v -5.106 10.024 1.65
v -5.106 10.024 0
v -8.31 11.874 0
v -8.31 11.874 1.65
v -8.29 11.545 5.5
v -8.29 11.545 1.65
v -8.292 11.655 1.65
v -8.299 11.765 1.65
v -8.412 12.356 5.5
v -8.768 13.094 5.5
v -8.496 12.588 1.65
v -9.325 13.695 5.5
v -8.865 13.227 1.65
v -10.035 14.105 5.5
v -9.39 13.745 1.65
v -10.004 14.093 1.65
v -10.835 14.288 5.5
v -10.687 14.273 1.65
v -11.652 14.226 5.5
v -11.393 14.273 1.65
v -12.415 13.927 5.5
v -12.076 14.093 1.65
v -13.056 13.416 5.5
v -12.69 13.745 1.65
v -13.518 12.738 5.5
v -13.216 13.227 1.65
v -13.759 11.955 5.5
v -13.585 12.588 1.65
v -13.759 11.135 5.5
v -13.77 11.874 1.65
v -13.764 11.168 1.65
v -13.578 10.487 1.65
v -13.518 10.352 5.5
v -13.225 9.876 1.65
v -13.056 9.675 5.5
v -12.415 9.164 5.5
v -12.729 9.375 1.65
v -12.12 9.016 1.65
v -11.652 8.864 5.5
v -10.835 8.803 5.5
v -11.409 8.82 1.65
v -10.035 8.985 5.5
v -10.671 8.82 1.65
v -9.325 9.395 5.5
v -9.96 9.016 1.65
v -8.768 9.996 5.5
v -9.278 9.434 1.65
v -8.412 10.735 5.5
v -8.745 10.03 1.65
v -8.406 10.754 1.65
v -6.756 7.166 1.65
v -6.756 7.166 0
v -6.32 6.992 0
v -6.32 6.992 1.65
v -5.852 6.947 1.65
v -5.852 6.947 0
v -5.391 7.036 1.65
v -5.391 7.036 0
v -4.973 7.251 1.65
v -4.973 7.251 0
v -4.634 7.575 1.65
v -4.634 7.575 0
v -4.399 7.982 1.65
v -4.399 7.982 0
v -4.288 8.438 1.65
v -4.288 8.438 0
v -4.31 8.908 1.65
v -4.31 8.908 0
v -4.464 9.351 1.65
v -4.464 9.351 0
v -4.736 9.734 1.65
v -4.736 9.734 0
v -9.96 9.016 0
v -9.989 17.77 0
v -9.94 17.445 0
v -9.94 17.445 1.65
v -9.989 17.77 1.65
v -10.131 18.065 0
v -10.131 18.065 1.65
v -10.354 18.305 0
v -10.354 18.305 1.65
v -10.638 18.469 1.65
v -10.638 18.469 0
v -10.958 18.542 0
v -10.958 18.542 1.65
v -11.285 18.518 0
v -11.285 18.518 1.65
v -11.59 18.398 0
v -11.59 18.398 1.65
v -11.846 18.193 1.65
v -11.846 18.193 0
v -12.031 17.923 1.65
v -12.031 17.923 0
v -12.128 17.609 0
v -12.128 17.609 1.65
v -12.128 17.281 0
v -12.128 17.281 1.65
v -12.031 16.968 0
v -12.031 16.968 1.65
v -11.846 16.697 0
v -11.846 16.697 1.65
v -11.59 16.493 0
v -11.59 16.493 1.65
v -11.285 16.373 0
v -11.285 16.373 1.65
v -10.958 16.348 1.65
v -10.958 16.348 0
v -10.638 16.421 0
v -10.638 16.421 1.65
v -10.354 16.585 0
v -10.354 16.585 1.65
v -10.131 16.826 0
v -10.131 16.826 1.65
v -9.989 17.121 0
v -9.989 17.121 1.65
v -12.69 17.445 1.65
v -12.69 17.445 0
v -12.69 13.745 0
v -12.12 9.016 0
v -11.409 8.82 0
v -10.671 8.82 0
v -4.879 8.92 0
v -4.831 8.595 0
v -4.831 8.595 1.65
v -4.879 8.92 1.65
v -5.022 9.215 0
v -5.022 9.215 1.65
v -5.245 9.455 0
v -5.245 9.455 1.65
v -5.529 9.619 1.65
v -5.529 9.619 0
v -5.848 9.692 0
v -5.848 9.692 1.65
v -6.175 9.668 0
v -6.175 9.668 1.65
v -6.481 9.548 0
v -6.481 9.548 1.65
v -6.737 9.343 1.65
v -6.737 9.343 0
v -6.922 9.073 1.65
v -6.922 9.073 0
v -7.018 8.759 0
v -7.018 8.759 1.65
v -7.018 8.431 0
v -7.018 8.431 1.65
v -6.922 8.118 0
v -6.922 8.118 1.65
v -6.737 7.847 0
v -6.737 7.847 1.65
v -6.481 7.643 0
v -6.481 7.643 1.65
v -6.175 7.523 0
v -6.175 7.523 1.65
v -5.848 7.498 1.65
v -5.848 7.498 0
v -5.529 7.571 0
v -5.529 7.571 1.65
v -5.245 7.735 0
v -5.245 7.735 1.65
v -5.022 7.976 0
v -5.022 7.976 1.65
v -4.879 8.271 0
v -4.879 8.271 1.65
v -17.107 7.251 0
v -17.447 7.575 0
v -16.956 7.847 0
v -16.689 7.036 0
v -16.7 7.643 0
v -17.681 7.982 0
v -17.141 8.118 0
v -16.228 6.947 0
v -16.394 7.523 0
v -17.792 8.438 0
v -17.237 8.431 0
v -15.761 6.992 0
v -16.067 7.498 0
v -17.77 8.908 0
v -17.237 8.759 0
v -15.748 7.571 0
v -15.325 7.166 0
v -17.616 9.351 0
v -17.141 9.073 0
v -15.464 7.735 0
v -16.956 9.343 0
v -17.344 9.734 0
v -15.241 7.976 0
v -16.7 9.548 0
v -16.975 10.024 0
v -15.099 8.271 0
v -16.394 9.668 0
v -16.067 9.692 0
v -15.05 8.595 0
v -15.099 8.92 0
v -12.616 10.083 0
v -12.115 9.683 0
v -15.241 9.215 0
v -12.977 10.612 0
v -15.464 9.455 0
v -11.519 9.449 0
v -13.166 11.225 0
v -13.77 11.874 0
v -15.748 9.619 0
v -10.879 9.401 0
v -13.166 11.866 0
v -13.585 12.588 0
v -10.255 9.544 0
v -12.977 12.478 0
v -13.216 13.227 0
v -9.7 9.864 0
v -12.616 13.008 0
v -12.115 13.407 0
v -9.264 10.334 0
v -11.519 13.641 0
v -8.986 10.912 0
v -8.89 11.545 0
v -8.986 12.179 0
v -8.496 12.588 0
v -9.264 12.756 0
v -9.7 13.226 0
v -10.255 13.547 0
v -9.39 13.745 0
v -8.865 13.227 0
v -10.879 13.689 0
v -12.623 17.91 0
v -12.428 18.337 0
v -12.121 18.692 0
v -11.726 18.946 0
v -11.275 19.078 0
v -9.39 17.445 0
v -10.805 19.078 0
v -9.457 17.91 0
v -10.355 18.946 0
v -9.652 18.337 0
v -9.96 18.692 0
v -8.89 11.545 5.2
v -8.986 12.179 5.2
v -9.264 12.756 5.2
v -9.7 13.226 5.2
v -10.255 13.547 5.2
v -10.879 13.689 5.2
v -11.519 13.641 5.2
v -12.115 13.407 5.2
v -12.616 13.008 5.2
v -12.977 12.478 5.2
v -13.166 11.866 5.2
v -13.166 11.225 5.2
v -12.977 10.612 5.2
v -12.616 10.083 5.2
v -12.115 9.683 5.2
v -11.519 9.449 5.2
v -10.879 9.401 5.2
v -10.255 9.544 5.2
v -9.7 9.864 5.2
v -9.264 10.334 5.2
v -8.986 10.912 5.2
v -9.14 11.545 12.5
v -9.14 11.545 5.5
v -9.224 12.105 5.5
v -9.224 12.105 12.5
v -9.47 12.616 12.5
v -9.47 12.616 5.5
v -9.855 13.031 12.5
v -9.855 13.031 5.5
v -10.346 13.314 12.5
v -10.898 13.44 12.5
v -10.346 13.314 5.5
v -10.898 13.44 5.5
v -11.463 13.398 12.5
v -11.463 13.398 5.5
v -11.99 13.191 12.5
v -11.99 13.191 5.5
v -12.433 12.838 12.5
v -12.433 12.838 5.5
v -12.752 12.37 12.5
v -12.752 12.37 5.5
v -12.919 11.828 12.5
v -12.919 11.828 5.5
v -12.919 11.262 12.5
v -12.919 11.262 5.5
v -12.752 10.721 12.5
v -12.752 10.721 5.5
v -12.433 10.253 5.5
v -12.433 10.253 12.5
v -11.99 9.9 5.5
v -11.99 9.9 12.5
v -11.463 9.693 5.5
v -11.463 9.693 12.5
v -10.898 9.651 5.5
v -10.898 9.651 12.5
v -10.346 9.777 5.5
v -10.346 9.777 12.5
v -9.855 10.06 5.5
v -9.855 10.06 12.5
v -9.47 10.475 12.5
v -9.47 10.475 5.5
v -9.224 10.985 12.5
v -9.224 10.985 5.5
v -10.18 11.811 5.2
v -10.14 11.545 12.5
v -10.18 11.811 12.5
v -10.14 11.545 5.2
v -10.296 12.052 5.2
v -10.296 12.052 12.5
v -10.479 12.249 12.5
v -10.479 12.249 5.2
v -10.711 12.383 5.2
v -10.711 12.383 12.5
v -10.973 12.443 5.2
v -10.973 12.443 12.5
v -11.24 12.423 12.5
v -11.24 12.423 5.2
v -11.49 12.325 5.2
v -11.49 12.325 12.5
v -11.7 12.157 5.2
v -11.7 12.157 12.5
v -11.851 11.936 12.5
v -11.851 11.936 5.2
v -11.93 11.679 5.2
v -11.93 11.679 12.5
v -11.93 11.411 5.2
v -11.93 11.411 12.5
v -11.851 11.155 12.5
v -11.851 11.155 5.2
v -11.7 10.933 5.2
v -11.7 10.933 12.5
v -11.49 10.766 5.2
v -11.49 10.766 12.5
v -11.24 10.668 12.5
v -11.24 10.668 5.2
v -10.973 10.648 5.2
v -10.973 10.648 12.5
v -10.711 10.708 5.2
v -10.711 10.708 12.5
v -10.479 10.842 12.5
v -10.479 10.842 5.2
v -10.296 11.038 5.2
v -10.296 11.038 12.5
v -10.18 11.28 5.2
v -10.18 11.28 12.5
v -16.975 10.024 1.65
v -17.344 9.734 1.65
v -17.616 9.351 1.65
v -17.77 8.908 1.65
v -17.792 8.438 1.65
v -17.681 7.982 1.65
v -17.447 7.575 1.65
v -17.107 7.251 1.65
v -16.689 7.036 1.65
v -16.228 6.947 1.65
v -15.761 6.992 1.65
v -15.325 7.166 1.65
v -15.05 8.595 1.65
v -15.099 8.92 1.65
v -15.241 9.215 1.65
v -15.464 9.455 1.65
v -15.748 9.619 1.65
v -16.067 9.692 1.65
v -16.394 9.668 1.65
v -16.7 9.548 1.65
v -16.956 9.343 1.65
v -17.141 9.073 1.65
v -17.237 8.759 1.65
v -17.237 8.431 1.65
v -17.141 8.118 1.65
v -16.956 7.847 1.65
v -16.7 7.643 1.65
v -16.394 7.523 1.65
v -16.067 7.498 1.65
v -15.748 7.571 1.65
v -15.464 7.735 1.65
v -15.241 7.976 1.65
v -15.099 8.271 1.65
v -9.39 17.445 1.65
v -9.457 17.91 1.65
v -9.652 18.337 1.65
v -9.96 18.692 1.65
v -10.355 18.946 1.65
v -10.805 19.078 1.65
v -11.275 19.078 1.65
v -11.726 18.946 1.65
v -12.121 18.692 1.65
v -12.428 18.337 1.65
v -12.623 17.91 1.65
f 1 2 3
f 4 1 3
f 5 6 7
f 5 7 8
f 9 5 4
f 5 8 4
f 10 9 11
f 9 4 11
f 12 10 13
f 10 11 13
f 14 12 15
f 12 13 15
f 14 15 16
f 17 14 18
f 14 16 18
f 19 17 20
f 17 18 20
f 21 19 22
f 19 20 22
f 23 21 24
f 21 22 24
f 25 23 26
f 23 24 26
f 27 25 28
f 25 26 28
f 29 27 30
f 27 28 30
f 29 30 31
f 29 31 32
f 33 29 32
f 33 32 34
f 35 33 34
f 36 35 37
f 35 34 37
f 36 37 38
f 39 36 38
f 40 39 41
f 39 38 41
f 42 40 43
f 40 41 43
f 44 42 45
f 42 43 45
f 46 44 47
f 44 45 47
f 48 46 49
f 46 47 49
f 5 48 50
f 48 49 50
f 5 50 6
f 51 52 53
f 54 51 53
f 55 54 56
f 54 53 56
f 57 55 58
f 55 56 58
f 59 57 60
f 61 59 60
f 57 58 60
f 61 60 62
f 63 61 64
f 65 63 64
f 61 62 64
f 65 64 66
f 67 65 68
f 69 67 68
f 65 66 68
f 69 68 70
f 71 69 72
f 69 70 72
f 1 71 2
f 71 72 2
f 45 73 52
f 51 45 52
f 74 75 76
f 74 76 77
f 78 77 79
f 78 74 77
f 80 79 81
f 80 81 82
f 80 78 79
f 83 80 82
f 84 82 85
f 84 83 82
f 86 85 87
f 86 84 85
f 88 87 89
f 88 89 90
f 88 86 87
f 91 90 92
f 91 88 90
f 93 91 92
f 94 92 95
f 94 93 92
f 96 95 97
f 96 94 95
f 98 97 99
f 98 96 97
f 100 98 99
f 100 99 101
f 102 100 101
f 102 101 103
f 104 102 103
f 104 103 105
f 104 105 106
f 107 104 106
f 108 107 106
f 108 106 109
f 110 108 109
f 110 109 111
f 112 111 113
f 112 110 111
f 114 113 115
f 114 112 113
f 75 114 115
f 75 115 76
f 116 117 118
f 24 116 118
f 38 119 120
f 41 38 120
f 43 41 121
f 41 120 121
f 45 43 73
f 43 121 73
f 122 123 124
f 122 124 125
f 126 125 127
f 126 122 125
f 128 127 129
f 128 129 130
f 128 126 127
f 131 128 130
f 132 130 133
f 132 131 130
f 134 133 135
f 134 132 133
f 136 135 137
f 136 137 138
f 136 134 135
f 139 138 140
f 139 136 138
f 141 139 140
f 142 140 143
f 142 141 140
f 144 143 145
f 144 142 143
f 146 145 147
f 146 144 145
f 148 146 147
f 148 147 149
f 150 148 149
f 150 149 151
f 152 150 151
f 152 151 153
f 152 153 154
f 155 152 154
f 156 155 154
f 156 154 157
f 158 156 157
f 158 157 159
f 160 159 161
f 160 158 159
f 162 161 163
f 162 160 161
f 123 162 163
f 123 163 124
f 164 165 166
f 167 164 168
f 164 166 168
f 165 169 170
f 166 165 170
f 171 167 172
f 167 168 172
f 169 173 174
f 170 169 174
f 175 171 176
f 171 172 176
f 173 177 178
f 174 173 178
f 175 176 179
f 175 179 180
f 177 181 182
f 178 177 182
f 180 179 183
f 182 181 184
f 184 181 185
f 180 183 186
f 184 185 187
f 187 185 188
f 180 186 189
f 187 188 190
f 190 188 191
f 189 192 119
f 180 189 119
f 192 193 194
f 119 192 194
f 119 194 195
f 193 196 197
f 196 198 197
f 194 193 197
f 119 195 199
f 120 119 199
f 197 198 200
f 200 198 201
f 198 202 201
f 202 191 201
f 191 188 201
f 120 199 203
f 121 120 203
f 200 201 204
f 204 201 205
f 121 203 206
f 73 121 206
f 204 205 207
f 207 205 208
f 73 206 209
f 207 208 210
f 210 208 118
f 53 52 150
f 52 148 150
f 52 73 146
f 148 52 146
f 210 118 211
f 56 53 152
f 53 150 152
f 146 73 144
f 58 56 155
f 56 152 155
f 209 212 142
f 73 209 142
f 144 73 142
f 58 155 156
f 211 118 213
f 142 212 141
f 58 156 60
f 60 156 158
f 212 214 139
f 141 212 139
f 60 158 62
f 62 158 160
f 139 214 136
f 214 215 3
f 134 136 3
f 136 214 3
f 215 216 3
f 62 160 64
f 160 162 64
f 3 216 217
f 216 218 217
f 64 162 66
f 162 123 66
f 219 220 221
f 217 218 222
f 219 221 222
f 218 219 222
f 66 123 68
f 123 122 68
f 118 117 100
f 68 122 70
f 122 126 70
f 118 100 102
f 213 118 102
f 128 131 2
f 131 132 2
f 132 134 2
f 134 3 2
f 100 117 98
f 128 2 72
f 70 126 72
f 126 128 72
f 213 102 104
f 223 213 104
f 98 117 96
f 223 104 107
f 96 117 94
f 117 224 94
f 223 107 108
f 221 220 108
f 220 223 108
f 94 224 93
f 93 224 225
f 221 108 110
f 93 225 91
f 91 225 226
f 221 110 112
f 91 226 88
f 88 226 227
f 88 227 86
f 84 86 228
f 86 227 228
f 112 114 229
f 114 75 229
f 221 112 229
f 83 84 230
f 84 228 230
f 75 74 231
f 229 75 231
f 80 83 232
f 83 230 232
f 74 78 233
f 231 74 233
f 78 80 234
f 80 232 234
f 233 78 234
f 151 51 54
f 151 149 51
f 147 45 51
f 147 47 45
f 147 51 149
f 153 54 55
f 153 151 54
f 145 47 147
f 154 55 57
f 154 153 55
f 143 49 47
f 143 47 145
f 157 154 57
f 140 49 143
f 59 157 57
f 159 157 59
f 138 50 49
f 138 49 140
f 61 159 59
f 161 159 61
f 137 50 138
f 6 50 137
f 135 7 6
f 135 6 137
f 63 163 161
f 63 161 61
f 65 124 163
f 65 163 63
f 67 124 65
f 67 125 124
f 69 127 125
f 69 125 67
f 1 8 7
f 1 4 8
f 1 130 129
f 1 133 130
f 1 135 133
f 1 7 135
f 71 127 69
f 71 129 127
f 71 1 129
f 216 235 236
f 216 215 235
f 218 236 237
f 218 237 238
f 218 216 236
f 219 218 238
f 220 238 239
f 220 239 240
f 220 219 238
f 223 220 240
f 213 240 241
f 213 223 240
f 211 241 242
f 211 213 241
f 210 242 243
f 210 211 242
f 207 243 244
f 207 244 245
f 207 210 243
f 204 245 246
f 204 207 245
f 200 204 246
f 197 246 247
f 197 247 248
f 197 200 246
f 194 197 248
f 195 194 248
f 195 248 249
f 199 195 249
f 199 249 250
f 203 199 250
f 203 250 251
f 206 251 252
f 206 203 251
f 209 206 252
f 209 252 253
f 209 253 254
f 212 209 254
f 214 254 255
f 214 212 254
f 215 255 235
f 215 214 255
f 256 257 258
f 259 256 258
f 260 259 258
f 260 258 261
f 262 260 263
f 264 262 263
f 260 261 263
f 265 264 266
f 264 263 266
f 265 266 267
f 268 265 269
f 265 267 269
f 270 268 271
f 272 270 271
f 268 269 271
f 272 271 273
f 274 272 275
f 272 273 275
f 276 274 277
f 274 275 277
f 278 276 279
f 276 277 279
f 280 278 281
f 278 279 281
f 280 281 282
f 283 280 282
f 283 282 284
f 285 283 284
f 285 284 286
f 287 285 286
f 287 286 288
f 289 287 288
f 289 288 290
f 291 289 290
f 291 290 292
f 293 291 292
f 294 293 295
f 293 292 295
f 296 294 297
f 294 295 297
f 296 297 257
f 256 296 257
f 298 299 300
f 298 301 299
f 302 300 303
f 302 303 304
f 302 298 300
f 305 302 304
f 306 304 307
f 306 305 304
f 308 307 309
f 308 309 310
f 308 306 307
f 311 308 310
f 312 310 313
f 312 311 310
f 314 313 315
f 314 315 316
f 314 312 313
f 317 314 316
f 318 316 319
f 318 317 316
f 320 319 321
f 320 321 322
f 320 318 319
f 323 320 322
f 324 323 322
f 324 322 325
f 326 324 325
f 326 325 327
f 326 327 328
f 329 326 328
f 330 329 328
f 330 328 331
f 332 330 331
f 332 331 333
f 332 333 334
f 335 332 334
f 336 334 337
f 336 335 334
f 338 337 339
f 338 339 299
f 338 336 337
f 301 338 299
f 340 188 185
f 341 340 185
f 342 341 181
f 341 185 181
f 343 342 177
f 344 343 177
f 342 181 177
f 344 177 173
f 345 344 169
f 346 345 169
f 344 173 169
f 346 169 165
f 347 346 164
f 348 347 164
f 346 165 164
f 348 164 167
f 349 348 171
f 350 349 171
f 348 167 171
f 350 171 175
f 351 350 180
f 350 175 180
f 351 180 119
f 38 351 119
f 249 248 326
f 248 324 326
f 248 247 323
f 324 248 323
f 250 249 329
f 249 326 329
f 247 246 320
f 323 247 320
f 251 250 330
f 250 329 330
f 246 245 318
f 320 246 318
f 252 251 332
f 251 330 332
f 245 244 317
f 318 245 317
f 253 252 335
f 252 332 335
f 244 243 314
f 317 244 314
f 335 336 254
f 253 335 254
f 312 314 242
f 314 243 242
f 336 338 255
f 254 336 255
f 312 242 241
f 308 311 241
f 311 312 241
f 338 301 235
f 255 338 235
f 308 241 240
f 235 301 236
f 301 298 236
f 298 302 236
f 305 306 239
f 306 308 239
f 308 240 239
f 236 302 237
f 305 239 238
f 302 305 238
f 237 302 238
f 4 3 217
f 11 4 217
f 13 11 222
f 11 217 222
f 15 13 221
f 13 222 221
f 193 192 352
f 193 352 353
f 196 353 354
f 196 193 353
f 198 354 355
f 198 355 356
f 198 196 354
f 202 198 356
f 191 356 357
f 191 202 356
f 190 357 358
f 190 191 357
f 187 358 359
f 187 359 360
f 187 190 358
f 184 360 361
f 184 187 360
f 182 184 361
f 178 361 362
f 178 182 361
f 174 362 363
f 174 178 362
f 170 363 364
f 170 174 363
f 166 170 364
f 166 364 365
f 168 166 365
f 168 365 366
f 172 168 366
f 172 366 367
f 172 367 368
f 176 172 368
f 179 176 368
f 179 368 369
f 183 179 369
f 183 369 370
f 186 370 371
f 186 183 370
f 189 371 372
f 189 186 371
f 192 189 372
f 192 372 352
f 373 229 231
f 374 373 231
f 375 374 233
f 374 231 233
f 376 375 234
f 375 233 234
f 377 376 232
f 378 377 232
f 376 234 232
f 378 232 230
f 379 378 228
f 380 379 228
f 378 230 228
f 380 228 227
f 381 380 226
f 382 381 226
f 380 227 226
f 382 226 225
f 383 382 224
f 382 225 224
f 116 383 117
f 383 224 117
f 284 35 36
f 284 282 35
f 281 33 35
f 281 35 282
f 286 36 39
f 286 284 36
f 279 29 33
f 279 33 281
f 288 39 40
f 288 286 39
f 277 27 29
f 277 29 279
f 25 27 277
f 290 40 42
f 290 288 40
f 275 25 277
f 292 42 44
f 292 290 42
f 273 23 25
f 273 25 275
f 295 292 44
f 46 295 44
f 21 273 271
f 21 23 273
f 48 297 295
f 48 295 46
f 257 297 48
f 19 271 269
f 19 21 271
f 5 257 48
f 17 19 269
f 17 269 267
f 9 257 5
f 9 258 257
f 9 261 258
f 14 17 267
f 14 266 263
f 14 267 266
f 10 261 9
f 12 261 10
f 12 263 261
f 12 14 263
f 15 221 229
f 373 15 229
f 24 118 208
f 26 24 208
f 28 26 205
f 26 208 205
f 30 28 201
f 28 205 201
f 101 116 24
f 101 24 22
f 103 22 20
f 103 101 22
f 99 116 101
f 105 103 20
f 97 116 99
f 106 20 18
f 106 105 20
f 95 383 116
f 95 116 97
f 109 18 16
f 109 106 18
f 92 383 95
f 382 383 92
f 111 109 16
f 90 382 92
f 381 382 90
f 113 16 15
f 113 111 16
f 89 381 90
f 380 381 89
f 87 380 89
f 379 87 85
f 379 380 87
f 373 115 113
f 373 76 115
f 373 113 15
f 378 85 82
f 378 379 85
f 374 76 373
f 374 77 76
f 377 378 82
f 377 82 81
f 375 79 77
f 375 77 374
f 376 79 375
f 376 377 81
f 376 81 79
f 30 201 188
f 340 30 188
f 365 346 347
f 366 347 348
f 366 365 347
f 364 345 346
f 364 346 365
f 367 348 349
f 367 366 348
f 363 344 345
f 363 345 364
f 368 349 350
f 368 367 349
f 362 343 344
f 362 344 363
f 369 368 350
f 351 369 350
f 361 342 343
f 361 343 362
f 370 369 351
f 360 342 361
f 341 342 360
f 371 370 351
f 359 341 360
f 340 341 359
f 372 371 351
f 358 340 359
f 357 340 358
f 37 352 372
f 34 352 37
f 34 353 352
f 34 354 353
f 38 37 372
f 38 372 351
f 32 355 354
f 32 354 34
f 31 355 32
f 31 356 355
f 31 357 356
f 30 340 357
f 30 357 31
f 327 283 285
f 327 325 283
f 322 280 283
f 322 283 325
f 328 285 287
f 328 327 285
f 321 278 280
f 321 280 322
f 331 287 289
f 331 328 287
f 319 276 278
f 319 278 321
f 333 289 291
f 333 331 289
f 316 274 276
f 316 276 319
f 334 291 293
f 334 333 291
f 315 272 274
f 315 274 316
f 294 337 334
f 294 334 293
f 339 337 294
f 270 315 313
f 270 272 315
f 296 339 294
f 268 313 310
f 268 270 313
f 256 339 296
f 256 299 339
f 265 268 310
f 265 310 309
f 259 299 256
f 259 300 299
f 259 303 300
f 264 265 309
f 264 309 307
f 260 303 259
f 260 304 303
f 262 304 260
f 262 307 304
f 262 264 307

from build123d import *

# Parameters (mm, degrees)
F0_R     = 1.1
F0_R_2   = 2.15
F1_DEPTH = 1.65
F2_R     = 2.75
F2_R_2   = 2.15
F3_DEPTH = 3.85
F4_R     = 2.15
F4_R_2   = 1.9
F4_R_3   = 0.9
F5_DEPTH = 0.3
F6_DEPTH = 7


with BuildPart() as f1:
    # F0 (on Top) → F1 (new body)
    with BuildSketch(Plane.XY):
        with BuildLine():
            ThreePointArc((-12.690082, 13.745292), (-11.040082, 14.295292), (-9.390082, 13.745292))
            Line((-9.390082, 13.745292), (-9.390082, 17.445292))
            ThreePointArc((-9.390082, 17.445292), (-11.040082, 19.095292), (-12.690082, 17.445292))
            Line((-12.690082, 17.445292), (-12.690082, 13.745292))
        make_face()
        with Locations((-11.040082, 17.445292)):
            Circle(F0_R, mode=Mode.SUBTRACT)
        with BuildLine():
            ThreePointArc((-9.959826, 9.01635), (-8.745174, 10.03007), (-8.290082, 11.545292))
            ThreePointArc((-8.290082, 11.545292), (-8.295022, 11.710059), (-8.309826, 11.874234))
            ThreePointArc((-8.309826, 11.874234), (-8.658512, 12.920292), (-9.390082, 13.745292))
            ThreePointArc((-9.390082, 13.745292), (-11.040082, 14.295292), (-12.690082, 13.745292))
            ThreePointArc((-12.690082, 13.745292), (-13.421652, 12.920292), (-13.770338, 11.874234))
            ThreePointArc((-13.770338, 11.874234), (-13.421652, 10.170292), (-12.120338, 9.01635))
            ThreePointArc((-12.120338, 9.01635), (-11.040082, 8.795292), (-9.959826, 9.01635))
        make_face()
        with Locations((-11.040082, 11.545292)):
            Circle(F0_R_2, mode=Mode.SUBTRACT)
        with BuildLine():
            ThreePointArc((-8.309826, 11.874234), (-8.295022, 11.710059), (-8.290082, 11.545292))
            ThreePointArc((-8.290082, 11.545292), (-8.745174, 10.03007), (-9.959826, 9.01635))
            Line((-9.959826, 9.01635), (-6.755532, 7.16635))
            ThreePointArc((-6.755532, 7.16635), (-4.50159, 7.770292), (-5.105532, 10.024234))
            Line((-5.105532, 10.024234), (-8.309826, 11.874234))
        make_face()
        with Locations((-5.930532, 8.595292)):
            Circle(F0_R, mode=Mode.SUBTRACT)
        with BuildLine():
            Line((-15.324632, 7.16635), (-12.120338, 9.01635))
            ThreePointArc((-12.120338, 9.01635), (-13.421652, 10.170292), (-13.770338, 11.874234))
            Line((-13.770338, 11.874234), (-16.974632, 10.024234))
            ThreePointArc((-16.974632, 10.024234), (-17.578574, 7.770292), (-15.324632, 7.16635))
        make_face()
        with Locations((-16.149632, 8.595292)):
            Circle(F0_R, mode=Mode.SUBTRACT)
    extrude(amount=F1_DEPTH)

    # F2 (on face) → F3 (join)
    with BuildSketch(Plane.XY.offset(1.65)):
        with Locations((-11.040082, 11.545292)):
            Circle(F2_R)
        with Locations((-11.040082, 11.545292)):
            Circle(F2_R_2, mode=Mode.SUBTRACT)
    extrude(amount=F3_DEPTH)

    # F4 (on face) → F5 (join)
    with BuildSketch(Plane.XY.offset(5.5)):
        with Locations((-11.040082, 11.545292)):
            Circle(F4_R)
        with Locations((-11.040082, 11.545292)):
            Circle(F4_R_2, mode=Mode.SUBTRACT)
        with Locations((-11.040082, 11.545292)):
            Circle(F4_R_2)
        with Locations((-11.040082, 11.545292)):
            Circle(F4_R_3, mode=Mode.SUBTRACT)
    extrude(amount=-F5_DEPTH)

    # F4 (on face) → F6 (join)
    with BuildSketch(Plane.XY.offset(5.5)):
        with Locations((-11.040082, 11.545292)):
            Circle(F4_R_2)
        with Locations((-11.040082, 11.545292)):
            Circle(F4_R_3, mode=Mode.SUBTRACT)
    extrude(amount=F6_DEPTH)


solid = f1.part
